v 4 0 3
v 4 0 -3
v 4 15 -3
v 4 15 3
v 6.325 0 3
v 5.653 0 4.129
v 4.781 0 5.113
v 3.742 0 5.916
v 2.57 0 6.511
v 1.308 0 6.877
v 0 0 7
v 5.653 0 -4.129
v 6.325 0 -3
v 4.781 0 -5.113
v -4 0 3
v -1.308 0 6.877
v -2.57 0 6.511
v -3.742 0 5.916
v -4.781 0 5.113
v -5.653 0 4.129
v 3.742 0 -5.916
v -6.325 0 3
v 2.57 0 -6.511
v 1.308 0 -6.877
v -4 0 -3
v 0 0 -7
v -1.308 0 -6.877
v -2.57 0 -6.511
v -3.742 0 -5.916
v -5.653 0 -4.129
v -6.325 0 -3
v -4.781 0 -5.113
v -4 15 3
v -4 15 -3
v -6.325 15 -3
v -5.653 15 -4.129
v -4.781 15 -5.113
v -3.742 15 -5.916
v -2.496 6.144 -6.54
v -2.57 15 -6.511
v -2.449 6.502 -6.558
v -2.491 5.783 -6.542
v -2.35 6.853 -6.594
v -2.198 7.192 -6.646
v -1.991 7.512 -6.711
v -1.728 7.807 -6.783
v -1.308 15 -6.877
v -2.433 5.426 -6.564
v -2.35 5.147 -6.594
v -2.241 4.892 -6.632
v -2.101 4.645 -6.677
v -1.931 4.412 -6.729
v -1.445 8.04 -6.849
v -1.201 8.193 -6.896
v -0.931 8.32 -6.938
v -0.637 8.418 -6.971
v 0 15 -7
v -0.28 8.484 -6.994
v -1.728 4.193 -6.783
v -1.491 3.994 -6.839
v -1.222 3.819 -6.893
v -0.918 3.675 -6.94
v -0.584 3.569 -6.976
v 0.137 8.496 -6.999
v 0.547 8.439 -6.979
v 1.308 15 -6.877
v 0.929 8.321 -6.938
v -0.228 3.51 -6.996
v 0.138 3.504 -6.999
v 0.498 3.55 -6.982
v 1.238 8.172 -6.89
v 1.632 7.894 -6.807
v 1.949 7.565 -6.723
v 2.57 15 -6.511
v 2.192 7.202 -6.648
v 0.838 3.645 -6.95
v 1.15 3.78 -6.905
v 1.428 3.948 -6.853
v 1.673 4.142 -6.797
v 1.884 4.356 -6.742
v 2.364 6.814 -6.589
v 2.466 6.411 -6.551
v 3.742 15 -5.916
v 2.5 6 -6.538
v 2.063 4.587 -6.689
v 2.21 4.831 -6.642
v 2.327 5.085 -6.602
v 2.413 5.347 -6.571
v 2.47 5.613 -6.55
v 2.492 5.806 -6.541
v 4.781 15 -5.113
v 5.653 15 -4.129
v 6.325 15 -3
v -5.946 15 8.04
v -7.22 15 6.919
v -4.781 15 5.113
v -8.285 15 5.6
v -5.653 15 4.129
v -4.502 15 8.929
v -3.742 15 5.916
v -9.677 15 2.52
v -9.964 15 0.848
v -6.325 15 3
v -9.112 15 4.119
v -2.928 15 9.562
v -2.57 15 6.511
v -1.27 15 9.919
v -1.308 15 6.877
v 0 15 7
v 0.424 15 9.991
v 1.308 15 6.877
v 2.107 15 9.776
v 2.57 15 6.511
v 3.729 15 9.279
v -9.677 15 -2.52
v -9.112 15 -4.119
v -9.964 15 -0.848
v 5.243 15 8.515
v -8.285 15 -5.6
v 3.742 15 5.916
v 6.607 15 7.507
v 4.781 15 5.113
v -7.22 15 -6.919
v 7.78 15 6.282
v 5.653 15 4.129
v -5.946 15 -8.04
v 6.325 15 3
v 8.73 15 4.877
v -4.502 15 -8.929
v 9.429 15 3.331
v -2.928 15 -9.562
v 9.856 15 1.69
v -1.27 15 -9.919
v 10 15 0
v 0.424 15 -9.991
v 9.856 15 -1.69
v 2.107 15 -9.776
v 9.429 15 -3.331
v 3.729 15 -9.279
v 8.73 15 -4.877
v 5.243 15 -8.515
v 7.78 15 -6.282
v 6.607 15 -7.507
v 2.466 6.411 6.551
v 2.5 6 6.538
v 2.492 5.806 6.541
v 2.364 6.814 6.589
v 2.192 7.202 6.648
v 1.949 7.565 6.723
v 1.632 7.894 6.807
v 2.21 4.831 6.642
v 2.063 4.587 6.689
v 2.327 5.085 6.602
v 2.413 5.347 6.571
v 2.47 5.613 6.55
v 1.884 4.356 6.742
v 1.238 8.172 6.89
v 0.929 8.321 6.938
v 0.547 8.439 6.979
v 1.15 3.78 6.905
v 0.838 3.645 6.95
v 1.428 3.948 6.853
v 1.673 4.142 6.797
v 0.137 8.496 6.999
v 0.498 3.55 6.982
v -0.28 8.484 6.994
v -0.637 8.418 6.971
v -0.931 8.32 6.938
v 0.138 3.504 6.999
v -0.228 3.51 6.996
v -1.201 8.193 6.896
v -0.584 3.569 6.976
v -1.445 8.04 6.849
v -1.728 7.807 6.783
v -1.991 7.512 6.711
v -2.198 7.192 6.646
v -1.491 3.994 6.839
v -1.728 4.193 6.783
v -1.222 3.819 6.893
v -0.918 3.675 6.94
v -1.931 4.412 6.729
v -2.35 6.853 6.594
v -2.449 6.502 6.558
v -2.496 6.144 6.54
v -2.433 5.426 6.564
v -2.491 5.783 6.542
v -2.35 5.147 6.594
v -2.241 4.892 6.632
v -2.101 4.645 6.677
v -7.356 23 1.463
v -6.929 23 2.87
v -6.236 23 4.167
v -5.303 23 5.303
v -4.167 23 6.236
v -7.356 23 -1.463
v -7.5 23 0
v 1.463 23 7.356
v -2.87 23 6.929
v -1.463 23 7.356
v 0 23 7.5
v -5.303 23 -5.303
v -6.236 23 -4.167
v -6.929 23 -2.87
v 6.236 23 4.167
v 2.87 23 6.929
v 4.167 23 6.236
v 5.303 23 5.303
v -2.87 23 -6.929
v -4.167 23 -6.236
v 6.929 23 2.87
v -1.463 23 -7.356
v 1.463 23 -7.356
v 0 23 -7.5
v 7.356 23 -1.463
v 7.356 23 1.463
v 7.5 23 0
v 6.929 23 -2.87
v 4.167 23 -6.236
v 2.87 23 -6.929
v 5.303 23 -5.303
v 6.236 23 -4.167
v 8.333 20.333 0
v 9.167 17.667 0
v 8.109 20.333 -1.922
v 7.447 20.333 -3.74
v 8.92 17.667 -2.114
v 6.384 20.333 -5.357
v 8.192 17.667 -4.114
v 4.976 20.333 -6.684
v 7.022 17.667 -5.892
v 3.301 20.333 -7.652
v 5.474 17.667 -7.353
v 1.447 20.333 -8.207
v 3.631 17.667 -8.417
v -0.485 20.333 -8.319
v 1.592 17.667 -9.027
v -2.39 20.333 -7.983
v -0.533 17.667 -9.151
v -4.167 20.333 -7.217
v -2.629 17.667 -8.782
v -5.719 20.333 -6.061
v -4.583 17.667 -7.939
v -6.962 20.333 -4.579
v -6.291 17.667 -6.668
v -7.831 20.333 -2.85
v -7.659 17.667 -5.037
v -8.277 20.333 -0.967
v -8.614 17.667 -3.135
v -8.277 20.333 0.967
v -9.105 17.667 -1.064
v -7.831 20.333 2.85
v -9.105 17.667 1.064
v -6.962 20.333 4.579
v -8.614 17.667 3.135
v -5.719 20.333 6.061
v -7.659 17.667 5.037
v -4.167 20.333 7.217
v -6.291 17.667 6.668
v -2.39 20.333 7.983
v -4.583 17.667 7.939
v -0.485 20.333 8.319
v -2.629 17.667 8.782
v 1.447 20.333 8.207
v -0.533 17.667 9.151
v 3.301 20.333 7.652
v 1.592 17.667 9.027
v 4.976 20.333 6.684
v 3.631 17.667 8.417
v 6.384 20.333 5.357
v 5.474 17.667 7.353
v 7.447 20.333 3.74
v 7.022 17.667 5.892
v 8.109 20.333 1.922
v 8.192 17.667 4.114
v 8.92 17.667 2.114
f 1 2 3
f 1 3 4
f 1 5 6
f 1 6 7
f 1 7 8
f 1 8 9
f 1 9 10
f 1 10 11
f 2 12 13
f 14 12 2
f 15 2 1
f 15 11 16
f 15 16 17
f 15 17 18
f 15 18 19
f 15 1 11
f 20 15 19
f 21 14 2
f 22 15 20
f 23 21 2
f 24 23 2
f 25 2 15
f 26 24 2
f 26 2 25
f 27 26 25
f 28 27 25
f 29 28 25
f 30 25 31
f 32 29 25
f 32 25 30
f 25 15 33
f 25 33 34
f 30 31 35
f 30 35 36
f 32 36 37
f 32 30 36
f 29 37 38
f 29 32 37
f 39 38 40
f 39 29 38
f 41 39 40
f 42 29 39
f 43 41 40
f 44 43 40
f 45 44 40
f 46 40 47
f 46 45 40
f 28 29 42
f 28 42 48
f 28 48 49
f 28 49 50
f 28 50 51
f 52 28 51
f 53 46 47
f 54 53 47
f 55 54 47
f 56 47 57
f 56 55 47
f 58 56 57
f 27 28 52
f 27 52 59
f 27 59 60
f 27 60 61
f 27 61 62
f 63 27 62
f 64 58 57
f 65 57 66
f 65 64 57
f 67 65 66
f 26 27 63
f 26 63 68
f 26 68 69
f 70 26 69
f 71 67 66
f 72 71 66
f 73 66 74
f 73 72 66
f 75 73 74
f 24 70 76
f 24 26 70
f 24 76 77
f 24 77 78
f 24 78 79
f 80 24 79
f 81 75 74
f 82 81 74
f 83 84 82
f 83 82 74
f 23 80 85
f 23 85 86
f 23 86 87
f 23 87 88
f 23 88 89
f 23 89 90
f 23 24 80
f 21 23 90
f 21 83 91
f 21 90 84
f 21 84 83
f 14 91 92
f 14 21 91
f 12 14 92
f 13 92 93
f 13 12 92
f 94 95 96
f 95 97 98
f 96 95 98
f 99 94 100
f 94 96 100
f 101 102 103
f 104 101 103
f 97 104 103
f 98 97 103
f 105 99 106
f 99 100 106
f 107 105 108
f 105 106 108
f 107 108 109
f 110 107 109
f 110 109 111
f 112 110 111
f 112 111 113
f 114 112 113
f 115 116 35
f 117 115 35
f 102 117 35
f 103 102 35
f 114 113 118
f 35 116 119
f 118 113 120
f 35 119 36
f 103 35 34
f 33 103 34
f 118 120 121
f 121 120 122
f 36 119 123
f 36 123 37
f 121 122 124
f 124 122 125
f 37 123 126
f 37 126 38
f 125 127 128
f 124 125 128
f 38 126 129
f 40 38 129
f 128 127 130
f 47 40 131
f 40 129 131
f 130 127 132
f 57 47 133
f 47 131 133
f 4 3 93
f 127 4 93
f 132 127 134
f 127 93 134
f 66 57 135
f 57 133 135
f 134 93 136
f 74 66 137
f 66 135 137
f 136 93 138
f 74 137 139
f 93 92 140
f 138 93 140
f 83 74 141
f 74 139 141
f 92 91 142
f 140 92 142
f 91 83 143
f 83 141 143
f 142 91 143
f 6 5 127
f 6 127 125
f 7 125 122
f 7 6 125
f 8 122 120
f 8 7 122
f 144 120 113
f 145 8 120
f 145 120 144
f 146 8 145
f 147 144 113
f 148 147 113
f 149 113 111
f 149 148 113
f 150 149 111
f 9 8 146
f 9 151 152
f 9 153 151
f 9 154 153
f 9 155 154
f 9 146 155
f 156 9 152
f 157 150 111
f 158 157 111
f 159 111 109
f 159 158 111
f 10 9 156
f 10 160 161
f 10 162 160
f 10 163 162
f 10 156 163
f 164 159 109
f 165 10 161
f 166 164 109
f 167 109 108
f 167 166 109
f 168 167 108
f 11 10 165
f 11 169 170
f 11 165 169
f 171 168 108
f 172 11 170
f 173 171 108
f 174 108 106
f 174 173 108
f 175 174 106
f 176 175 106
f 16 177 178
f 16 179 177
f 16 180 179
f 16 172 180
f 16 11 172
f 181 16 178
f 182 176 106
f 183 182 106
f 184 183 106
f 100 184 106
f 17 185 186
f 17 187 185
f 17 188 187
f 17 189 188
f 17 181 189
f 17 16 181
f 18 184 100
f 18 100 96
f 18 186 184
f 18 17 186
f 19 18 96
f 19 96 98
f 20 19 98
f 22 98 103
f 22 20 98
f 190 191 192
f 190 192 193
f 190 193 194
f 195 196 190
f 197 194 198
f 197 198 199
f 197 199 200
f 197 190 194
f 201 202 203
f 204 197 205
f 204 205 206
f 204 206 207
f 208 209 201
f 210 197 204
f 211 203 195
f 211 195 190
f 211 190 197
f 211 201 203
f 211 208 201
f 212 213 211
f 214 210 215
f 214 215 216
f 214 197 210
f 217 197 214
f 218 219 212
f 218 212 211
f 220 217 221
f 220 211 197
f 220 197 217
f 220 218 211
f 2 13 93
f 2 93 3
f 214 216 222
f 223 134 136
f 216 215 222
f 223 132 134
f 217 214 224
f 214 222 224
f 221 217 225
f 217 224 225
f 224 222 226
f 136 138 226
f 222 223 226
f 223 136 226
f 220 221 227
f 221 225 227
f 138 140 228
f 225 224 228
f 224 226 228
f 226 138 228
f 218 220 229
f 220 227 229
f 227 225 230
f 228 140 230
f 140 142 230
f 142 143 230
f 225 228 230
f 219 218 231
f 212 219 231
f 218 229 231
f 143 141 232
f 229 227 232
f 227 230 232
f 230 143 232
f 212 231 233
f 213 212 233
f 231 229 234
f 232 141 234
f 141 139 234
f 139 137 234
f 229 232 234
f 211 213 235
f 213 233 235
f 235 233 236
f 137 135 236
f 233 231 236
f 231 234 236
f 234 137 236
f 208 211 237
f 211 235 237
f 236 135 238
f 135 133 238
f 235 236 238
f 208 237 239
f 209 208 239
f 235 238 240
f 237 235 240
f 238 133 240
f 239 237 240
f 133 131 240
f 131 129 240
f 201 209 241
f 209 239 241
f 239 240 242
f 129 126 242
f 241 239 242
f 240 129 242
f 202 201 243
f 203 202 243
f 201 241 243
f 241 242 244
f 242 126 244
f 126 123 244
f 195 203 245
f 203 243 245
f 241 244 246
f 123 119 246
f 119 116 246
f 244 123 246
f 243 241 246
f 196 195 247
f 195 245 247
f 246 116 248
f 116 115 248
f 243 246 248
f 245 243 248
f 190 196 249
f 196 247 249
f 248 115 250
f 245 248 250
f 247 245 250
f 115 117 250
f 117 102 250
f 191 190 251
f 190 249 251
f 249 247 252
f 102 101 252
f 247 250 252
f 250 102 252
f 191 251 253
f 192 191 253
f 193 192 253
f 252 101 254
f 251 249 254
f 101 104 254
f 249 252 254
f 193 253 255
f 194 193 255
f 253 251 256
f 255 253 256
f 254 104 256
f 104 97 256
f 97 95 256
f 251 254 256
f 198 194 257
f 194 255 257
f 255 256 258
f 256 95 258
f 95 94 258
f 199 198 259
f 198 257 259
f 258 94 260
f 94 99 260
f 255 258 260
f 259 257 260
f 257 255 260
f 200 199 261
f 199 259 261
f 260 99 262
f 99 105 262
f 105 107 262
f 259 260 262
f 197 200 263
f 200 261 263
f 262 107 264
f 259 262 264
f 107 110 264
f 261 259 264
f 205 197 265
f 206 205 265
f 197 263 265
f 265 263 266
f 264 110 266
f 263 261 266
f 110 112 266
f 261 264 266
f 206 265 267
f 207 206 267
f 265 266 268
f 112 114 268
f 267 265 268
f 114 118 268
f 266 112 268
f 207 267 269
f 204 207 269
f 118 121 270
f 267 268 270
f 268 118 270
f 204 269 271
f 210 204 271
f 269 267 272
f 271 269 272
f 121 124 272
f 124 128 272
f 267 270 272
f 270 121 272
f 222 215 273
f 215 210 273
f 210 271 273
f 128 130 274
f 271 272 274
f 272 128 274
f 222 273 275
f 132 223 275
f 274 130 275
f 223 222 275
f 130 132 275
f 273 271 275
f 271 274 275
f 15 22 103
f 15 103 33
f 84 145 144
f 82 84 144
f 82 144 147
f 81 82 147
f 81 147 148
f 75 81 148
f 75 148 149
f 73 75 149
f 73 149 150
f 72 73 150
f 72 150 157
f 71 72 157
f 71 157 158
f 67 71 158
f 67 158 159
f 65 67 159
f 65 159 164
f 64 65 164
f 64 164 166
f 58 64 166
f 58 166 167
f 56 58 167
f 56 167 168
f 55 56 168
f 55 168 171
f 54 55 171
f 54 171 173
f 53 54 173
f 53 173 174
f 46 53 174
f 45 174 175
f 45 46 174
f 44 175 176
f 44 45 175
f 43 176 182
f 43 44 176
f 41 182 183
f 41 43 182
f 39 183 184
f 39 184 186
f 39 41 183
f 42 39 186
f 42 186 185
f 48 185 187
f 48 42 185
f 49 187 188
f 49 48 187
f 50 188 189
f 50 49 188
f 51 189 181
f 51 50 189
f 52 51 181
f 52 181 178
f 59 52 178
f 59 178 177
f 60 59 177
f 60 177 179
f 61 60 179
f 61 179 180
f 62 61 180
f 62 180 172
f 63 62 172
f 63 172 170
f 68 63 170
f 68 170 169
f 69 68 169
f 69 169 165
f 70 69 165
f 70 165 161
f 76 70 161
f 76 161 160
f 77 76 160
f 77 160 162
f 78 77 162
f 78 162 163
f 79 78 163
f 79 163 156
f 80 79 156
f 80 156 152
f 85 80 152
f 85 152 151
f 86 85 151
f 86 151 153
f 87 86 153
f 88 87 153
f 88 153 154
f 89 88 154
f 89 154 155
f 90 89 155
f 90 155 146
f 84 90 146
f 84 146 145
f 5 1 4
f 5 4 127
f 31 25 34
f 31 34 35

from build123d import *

# Parameters (mm, degrees)
BOSS_EXTRUDE1_DEPTH     = 15
SKETCH3_R               = 7.5
SKETCH2_R               = 10
SKETCH4_R               = 2.5
CUT_EXTRUDE1_DEPTH      = 22.0000001
CUT_EXTRUDE1_DEPTH_BACK = 1


with BuildPart() as part:
    # Sketch1 → Boss-Extrude1 (new body)
    with BuildSketch(Plane(origin=(0, 0, 0), x_dir=(1, 0, 0), z_dir=(0, 1, 0))):
        with BuildLine():
            Line((-6.32455532, -3), (-4, -3))
            Line((-4, -3), (-4, 3))
            Line((-4, 3), (-6.32455532, 3))
            ThreePointArc((-6.32455532, 3), (0, 7), (6.32455532, 3))
            Line((6.32455532, 3), (4, 3))
            Line((4, 3), (4, -3))
            Line((4, -3), (6.32455532, -3))
            ThreePointArc((6.32455532, -3), (0, -7), (-6.32455532, -3))
        make_face()
    extrude(amount=BOSS_EXTRUDE1_DEPTH)

    # Sketch3 → Loft1 section 0
    with BuildSketch(Plane(origin=(0, 23, 0), x_dir=(1, 0, 0), z_dir=(0, 1, 0))):
        Circle(SKETCH3_R)
    # Sketch2 → Loft1 section 1
    with BuildSketch(Plane(origin=(0, 15, 0), x_dir=(1, 0, 0), z_dir=(0, 1, 0))):
        Circle(SKETCH2_R)
    loft()

    # Sketch4 → Cut-Extrude1 (cut, two sides)
    with BuildSketch(Plane.XY.offset(-11)) as cut_extrude1_sk:
        with Locations((0, 6)):
            Circle(SKETCH4_R)
    extrude(amount=CUT_EXTRUDE1_DEPTH, mode=Mode.SUBTRACT)
    extrude(cut_extrude1_sk.sketch, amount=-CUT_EXTRUDE1_DEPTH_BACK, mode=Mode.SUBTRACT)


solid = part.part
